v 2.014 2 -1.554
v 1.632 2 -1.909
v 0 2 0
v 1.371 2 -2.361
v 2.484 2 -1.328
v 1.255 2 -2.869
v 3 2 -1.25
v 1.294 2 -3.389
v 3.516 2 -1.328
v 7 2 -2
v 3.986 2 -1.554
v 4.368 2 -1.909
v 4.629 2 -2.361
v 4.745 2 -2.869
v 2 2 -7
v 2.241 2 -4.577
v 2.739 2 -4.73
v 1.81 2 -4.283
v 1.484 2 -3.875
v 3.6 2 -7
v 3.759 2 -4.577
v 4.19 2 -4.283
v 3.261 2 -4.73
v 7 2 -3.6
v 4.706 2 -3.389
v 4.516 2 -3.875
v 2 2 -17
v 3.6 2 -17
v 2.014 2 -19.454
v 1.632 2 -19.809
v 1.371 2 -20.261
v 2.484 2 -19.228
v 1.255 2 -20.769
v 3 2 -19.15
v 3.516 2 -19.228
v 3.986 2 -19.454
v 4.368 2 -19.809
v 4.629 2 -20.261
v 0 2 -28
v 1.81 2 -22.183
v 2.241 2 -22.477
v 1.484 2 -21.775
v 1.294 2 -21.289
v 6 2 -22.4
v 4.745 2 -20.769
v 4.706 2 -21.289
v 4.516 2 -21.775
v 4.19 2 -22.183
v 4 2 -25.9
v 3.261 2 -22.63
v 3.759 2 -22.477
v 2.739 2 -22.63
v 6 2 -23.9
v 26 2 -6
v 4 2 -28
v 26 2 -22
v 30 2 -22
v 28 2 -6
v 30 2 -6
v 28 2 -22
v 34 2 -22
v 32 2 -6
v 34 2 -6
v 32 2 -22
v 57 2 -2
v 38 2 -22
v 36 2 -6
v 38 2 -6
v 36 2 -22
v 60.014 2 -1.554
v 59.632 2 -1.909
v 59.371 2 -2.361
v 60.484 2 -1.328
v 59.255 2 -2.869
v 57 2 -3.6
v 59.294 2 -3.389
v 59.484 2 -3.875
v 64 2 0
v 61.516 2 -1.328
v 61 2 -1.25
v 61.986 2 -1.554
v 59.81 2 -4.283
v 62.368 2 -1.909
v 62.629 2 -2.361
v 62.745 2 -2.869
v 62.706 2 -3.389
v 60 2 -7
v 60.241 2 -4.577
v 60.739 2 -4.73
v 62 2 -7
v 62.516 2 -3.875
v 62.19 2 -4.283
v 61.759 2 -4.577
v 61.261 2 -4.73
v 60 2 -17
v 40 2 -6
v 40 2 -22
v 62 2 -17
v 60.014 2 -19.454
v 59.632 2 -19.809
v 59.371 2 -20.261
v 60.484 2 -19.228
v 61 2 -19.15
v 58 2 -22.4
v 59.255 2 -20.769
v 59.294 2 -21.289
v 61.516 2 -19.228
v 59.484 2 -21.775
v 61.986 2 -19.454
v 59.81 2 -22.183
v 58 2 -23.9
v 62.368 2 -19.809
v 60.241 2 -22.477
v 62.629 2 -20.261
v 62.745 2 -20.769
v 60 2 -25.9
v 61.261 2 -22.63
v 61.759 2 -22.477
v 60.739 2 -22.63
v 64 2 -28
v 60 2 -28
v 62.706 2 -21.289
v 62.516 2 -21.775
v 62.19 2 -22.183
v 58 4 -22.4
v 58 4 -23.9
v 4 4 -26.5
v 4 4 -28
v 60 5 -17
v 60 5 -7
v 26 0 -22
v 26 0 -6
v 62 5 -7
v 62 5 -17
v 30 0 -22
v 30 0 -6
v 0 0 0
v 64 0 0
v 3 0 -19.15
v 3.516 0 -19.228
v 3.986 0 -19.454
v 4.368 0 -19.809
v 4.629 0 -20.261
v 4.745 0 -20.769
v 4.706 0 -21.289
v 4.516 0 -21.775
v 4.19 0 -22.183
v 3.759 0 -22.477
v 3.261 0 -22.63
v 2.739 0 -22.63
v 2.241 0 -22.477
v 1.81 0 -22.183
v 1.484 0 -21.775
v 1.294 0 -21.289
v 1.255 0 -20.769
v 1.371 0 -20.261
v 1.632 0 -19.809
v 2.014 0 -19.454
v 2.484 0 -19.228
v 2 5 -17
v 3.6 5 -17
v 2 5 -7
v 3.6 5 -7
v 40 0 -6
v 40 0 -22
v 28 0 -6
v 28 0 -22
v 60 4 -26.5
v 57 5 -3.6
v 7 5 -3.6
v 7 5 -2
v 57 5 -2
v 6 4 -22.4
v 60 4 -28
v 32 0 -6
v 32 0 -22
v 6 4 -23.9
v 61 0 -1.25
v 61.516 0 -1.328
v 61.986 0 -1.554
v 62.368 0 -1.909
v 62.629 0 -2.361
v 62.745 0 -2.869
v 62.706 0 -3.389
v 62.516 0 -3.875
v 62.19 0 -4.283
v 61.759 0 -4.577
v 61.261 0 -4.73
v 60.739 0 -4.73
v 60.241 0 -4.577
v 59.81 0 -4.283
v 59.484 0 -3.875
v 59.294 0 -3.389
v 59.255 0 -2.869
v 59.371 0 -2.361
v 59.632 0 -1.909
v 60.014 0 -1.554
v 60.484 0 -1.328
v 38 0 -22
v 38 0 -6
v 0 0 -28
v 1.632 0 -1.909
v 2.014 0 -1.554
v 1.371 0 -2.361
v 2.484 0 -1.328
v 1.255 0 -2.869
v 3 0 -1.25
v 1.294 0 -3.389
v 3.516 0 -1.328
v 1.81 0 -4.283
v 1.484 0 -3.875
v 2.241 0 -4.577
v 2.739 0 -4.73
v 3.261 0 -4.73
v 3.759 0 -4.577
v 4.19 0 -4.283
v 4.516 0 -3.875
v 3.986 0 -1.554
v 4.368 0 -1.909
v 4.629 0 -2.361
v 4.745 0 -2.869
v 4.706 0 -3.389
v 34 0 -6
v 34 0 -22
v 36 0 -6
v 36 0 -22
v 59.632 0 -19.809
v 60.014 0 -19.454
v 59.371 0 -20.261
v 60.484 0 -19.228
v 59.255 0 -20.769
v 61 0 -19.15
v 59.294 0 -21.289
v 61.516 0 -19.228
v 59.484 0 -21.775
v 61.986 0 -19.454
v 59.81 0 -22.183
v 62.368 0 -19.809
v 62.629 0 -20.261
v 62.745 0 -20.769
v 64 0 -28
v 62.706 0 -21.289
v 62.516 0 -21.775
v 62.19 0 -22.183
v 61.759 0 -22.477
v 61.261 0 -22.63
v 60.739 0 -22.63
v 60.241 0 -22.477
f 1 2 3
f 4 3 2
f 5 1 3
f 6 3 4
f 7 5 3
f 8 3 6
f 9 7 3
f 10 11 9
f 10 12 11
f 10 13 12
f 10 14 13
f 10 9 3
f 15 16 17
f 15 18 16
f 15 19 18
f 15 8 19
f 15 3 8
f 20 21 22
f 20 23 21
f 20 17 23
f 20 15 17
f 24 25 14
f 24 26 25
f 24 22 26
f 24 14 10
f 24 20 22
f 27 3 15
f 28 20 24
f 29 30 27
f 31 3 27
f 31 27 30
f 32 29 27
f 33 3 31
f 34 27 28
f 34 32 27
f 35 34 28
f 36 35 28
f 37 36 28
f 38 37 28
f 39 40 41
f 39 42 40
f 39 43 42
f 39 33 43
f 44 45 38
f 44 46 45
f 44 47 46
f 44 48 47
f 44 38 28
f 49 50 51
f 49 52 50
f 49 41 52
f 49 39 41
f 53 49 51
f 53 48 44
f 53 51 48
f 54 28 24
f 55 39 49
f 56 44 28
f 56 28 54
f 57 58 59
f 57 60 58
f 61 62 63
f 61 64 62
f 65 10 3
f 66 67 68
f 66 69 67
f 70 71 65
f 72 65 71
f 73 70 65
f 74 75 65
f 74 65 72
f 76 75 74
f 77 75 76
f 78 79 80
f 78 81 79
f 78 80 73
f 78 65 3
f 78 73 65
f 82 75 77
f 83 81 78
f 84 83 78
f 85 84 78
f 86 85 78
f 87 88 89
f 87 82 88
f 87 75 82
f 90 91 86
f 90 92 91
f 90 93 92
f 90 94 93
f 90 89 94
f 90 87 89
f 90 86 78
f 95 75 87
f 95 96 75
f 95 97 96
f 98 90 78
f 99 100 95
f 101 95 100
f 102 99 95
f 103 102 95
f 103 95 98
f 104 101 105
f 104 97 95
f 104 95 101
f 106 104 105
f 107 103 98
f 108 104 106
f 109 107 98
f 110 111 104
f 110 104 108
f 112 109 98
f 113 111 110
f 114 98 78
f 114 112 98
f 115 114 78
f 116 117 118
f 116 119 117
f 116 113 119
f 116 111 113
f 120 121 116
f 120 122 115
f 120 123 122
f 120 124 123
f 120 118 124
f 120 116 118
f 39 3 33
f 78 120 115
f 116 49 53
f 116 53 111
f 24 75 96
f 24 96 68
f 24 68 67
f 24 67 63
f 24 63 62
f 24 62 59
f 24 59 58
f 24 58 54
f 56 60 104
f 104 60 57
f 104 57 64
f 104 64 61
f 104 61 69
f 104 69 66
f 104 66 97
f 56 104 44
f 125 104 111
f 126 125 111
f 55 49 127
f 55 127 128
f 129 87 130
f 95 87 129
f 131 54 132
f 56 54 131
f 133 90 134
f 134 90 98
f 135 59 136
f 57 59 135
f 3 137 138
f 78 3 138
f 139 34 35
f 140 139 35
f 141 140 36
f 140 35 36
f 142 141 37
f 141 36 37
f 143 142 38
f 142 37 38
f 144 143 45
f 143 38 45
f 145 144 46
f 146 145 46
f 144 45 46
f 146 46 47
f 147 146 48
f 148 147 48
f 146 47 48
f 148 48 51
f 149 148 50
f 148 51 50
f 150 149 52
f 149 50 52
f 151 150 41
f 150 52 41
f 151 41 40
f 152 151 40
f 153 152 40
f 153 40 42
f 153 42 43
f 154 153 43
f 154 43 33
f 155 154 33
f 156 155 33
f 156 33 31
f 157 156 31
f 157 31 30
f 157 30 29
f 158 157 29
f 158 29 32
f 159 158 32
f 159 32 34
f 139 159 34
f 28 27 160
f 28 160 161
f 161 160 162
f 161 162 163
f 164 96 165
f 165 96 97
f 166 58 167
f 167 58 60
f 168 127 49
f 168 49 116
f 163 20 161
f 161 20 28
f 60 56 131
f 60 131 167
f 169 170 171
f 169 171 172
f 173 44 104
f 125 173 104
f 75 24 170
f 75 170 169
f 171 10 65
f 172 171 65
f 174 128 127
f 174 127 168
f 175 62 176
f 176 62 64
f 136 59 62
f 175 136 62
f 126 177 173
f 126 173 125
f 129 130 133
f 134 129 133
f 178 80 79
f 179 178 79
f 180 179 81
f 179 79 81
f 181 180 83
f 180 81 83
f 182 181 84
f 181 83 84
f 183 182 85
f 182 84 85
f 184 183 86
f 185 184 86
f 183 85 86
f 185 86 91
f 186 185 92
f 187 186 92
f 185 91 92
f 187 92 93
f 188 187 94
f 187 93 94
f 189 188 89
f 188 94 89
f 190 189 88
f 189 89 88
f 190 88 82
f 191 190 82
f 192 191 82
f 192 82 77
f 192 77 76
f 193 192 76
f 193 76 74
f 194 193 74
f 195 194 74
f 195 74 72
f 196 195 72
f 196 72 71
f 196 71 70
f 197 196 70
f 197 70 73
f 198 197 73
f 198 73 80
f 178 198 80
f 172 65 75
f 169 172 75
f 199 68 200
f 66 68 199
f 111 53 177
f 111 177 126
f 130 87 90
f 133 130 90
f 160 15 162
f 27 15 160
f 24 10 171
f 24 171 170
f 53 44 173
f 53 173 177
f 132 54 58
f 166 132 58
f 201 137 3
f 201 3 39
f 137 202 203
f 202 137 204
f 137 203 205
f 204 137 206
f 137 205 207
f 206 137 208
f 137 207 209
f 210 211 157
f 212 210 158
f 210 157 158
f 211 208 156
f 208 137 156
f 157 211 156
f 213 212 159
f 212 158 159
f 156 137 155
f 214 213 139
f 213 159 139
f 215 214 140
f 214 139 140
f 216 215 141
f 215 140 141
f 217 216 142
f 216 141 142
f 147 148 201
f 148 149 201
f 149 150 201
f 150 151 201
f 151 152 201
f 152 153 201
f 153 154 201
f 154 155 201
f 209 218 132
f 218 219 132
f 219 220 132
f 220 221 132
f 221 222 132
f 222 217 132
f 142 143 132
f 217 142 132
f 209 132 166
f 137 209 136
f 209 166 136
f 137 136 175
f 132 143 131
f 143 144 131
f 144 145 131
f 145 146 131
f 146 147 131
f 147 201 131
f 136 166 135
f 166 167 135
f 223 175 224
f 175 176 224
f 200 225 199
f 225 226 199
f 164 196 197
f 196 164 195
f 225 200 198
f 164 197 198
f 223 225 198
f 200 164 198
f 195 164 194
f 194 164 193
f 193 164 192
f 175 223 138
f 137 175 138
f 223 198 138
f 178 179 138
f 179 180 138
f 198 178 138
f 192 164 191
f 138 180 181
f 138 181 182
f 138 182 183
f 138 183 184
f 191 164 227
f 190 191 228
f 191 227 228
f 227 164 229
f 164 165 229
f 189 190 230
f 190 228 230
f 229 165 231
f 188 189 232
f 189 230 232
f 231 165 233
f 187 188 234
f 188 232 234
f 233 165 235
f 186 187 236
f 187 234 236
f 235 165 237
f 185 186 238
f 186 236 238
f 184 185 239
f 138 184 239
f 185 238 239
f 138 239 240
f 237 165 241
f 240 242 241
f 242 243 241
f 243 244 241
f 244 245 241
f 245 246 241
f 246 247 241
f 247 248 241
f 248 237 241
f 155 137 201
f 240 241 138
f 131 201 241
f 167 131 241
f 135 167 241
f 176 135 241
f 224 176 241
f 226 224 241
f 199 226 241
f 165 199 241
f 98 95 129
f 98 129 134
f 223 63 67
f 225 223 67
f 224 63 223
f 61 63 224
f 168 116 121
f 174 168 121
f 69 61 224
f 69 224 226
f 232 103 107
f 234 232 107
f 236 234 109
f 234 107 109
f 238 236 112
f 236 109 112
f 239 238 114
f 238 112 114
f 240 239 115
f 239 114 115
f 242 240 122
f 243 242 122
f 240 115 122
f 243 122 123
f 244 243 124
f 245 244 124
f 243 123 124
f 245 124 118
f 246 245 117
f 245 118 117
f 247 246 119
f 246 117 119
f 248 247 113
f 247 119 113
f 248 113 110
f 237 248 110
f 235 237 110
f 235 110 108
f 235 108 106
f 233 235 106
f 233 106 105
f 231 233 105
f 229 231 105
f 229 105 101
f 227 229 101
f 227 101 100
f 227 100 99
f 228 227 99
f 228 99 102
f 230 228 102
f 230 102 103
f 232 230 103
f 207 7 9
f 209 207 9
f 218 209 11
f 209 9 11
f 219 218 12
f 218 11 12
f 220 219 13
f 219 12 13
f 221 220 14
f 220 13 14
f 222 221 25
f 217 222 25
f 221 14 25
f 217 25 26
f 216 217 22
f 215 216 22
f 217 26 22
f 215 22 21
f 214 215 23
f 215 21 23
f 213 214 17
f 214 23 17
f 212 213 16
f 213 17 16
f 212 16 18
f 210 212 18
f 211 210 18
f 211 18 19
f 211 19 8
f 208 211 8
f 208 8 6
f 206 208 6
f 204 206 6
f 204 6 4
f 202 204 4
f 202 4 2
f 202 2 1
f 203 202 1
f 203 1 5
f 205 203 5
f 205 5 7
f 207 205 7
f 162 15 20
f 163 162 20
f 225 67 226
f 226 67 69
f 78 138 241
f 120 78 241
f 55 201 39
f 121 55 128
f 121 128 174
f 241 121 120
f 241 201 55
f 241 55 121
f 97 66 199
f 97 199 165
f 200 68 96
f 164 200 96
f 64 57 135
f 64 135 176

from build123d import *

# Parameters (mm, degrees)
SKIZZE1_W                       = 64
SKIZZE1_H                       = 28
AUFSATZ_LINEAR_AUSTRAGEN1_DEPTH = 2
SKIZZE2_R                       = 1.75
SCHNITT_LINEAR_AUSTRAGEN1_DEPTH = 70.885620839
SKIZZE3_W                       = 2
SKIZZE3_H                       = 16
SCHNITT_LINEAR_AUSTRAGEN2_DEPTH = 70.885620839
LINEARES_MUSTER1_COUNT          = 4
LINEARES_MUSTER1_PITCH          = 4
SKIZZE5_W                       = 1.6
SKIZZE5_H                       = 10
SKIZZE5_W_2                     = 50
SKIZZE5_H_2                     = 1.6
SKIZZE5_W_3                     = 2
AUFSATZ_LINEAR_AUSTRAGEN2_DEPTH = 3
SKIZZE6_W                       = 52
SKIZZE6_H                       = 1.5
AUFSATZ_LINEAR_AUSTRAGEN3_DEPTH = 2
SKIZZE7_W                       = 56
SKIZZE7_H                       = 2.1
AUFSATZ_LINEAR_AUSTRAGEN4_DEPTH = 2
FASE1_SIZE2                     = 0.6
FASE1_SIZE                      = 2


with BuildPart() as part:
    # Skizze1 → Aufsatz-Linear austragen1 (new body)
    with BuildSketch(Plane(origin=(0, 0, 0), x_dir=(1, 0, 0), z_dir=(0, 1, 0))):
        with Locations((32, 14)):
            Rectangle(SKIZZE1_W, SKIZZE1_H)
    extrude(amount=AUFSATZ_LINEAR_AUSTRAGEN1_DEPTH)

    # Skizze2 → Schnitt-Linear austragen1 (cut, through all)
    with BuildSketch(Plane(origin=(0, 2, 0), x_dir=(1, 0, 0), z_dir=(0, 1, 0))):
        with Locations(Location((3, 3, 0), (0, 0, 270))):
            Circle(SKIZZE2_R)
        with Locations(Location((3, 20.9, 0), (0, 0, 270))):
            Circle(SKIZZE2_R)
        with Locations(Location((61, 20.9, 0), (0, 0, 270))):
            Circle(SKIZZE2_R)
        with Locations(Location((61, 3, 0), (0, 0, 270))):
            Circle(SKIZZE2_R)
    extrude(amount=-SCHNITT_LINEAR_AUSTRAGEN1_DEPTH, mode=Mode.SUBTRACT)

    # Skizze3 → Schnitt-Linear austragen2 (cut, through all)
    with BuildSketch(Plane(origin=(0, 2, 0), x_dir=(1, 0, 0), z_dir=(0, 1, 0))):
        with Locations((27, 14)):
            Rectangle(SKIZZE3_W, SKIZZE3_H)
    schnitt_linear_austragen2 = extrude(amount=-SCHNITT_LINEAR_AUSTRAGEN2_DEPTH, mode=Mode.SUBTRACT)

    # Lineares Muster1: Schnitt-Linear austragen2 ×4
    with Locations(*[(i * LINEARES_MUSTER1_PITCH, 0, 0) for i in range(1, LINEARES_MUSTER1_COUNT)]):
        add(schnitt_linear_austragen2, mode=Mode.SUBTRACT)

    # Skizze5 → Aufsatz-Linear austragen2 (add)
    with BuildSketch(Plane(origin=(0, 2, 0), x_dir=(1, 0, 0), z_dir=(0, 1, 0))):
        with Locations((2.8, 12)):
            Rectangle(SKIZZE5_W, SKIZZE5_H)
        with Locations((32, 2.8)):
            Rectangle(SKIZZE5_W_2, SKIZZE5_H_2)
        with Locations((61, 12)):
            Rectangle(SKIZZE5_W_3, SKIZZE5_H)
    extrude(amount=AUFSATZ_LINEAR_AUSTRAGEN2_DEPTH)

    # Skizze6 → Aufsatz-Linear austragen3 (add)
    with BuildSketch(Plane(origin=(0, 2, 0), x_dir=(1, 0, 0), z_dir=(0, 1, 0))):
        with Locations((32, 23.15)):
            Rectangle(SKIZZE6_W, SKIZZE6_H)
    extrude(amount=AUFSATZ_LINEAR_AUSTRAGEN3_DEPTH)

    # Skizze7 → Aufsatz-Linear austragen4 (add)
    with BuildSketch(Plane(origin=(0, 2, 0), x_dir=(1, 0, 0), z_dir=(0, 1, 0))):
        with Locations((32, 26.95)):
            Rectangle(SKIZZE7_W, SKIZZE7_H)
    extrude(amount=AUFSATZ_LINEAR_AUSTRAGEN4_DEPTH)

    # Fase1
    fase1_edges = [part.edges().sort_by_distance(p)[0] for p in [
        (32, 4, -25.9),
    ]]
    fase1_side = [part.faces().sort_by_distance(p)[0] for p in [
        (32, 3.988, -25.9),
    ]]
    chamfer(fase1_edges, length=FASE1_SIZE - 0.0001, length2=FASE1_SIZE2 - 0.0001, reference=fase1_side[0])  # a hair under: the kernel refuses the full size


solid = part.part
